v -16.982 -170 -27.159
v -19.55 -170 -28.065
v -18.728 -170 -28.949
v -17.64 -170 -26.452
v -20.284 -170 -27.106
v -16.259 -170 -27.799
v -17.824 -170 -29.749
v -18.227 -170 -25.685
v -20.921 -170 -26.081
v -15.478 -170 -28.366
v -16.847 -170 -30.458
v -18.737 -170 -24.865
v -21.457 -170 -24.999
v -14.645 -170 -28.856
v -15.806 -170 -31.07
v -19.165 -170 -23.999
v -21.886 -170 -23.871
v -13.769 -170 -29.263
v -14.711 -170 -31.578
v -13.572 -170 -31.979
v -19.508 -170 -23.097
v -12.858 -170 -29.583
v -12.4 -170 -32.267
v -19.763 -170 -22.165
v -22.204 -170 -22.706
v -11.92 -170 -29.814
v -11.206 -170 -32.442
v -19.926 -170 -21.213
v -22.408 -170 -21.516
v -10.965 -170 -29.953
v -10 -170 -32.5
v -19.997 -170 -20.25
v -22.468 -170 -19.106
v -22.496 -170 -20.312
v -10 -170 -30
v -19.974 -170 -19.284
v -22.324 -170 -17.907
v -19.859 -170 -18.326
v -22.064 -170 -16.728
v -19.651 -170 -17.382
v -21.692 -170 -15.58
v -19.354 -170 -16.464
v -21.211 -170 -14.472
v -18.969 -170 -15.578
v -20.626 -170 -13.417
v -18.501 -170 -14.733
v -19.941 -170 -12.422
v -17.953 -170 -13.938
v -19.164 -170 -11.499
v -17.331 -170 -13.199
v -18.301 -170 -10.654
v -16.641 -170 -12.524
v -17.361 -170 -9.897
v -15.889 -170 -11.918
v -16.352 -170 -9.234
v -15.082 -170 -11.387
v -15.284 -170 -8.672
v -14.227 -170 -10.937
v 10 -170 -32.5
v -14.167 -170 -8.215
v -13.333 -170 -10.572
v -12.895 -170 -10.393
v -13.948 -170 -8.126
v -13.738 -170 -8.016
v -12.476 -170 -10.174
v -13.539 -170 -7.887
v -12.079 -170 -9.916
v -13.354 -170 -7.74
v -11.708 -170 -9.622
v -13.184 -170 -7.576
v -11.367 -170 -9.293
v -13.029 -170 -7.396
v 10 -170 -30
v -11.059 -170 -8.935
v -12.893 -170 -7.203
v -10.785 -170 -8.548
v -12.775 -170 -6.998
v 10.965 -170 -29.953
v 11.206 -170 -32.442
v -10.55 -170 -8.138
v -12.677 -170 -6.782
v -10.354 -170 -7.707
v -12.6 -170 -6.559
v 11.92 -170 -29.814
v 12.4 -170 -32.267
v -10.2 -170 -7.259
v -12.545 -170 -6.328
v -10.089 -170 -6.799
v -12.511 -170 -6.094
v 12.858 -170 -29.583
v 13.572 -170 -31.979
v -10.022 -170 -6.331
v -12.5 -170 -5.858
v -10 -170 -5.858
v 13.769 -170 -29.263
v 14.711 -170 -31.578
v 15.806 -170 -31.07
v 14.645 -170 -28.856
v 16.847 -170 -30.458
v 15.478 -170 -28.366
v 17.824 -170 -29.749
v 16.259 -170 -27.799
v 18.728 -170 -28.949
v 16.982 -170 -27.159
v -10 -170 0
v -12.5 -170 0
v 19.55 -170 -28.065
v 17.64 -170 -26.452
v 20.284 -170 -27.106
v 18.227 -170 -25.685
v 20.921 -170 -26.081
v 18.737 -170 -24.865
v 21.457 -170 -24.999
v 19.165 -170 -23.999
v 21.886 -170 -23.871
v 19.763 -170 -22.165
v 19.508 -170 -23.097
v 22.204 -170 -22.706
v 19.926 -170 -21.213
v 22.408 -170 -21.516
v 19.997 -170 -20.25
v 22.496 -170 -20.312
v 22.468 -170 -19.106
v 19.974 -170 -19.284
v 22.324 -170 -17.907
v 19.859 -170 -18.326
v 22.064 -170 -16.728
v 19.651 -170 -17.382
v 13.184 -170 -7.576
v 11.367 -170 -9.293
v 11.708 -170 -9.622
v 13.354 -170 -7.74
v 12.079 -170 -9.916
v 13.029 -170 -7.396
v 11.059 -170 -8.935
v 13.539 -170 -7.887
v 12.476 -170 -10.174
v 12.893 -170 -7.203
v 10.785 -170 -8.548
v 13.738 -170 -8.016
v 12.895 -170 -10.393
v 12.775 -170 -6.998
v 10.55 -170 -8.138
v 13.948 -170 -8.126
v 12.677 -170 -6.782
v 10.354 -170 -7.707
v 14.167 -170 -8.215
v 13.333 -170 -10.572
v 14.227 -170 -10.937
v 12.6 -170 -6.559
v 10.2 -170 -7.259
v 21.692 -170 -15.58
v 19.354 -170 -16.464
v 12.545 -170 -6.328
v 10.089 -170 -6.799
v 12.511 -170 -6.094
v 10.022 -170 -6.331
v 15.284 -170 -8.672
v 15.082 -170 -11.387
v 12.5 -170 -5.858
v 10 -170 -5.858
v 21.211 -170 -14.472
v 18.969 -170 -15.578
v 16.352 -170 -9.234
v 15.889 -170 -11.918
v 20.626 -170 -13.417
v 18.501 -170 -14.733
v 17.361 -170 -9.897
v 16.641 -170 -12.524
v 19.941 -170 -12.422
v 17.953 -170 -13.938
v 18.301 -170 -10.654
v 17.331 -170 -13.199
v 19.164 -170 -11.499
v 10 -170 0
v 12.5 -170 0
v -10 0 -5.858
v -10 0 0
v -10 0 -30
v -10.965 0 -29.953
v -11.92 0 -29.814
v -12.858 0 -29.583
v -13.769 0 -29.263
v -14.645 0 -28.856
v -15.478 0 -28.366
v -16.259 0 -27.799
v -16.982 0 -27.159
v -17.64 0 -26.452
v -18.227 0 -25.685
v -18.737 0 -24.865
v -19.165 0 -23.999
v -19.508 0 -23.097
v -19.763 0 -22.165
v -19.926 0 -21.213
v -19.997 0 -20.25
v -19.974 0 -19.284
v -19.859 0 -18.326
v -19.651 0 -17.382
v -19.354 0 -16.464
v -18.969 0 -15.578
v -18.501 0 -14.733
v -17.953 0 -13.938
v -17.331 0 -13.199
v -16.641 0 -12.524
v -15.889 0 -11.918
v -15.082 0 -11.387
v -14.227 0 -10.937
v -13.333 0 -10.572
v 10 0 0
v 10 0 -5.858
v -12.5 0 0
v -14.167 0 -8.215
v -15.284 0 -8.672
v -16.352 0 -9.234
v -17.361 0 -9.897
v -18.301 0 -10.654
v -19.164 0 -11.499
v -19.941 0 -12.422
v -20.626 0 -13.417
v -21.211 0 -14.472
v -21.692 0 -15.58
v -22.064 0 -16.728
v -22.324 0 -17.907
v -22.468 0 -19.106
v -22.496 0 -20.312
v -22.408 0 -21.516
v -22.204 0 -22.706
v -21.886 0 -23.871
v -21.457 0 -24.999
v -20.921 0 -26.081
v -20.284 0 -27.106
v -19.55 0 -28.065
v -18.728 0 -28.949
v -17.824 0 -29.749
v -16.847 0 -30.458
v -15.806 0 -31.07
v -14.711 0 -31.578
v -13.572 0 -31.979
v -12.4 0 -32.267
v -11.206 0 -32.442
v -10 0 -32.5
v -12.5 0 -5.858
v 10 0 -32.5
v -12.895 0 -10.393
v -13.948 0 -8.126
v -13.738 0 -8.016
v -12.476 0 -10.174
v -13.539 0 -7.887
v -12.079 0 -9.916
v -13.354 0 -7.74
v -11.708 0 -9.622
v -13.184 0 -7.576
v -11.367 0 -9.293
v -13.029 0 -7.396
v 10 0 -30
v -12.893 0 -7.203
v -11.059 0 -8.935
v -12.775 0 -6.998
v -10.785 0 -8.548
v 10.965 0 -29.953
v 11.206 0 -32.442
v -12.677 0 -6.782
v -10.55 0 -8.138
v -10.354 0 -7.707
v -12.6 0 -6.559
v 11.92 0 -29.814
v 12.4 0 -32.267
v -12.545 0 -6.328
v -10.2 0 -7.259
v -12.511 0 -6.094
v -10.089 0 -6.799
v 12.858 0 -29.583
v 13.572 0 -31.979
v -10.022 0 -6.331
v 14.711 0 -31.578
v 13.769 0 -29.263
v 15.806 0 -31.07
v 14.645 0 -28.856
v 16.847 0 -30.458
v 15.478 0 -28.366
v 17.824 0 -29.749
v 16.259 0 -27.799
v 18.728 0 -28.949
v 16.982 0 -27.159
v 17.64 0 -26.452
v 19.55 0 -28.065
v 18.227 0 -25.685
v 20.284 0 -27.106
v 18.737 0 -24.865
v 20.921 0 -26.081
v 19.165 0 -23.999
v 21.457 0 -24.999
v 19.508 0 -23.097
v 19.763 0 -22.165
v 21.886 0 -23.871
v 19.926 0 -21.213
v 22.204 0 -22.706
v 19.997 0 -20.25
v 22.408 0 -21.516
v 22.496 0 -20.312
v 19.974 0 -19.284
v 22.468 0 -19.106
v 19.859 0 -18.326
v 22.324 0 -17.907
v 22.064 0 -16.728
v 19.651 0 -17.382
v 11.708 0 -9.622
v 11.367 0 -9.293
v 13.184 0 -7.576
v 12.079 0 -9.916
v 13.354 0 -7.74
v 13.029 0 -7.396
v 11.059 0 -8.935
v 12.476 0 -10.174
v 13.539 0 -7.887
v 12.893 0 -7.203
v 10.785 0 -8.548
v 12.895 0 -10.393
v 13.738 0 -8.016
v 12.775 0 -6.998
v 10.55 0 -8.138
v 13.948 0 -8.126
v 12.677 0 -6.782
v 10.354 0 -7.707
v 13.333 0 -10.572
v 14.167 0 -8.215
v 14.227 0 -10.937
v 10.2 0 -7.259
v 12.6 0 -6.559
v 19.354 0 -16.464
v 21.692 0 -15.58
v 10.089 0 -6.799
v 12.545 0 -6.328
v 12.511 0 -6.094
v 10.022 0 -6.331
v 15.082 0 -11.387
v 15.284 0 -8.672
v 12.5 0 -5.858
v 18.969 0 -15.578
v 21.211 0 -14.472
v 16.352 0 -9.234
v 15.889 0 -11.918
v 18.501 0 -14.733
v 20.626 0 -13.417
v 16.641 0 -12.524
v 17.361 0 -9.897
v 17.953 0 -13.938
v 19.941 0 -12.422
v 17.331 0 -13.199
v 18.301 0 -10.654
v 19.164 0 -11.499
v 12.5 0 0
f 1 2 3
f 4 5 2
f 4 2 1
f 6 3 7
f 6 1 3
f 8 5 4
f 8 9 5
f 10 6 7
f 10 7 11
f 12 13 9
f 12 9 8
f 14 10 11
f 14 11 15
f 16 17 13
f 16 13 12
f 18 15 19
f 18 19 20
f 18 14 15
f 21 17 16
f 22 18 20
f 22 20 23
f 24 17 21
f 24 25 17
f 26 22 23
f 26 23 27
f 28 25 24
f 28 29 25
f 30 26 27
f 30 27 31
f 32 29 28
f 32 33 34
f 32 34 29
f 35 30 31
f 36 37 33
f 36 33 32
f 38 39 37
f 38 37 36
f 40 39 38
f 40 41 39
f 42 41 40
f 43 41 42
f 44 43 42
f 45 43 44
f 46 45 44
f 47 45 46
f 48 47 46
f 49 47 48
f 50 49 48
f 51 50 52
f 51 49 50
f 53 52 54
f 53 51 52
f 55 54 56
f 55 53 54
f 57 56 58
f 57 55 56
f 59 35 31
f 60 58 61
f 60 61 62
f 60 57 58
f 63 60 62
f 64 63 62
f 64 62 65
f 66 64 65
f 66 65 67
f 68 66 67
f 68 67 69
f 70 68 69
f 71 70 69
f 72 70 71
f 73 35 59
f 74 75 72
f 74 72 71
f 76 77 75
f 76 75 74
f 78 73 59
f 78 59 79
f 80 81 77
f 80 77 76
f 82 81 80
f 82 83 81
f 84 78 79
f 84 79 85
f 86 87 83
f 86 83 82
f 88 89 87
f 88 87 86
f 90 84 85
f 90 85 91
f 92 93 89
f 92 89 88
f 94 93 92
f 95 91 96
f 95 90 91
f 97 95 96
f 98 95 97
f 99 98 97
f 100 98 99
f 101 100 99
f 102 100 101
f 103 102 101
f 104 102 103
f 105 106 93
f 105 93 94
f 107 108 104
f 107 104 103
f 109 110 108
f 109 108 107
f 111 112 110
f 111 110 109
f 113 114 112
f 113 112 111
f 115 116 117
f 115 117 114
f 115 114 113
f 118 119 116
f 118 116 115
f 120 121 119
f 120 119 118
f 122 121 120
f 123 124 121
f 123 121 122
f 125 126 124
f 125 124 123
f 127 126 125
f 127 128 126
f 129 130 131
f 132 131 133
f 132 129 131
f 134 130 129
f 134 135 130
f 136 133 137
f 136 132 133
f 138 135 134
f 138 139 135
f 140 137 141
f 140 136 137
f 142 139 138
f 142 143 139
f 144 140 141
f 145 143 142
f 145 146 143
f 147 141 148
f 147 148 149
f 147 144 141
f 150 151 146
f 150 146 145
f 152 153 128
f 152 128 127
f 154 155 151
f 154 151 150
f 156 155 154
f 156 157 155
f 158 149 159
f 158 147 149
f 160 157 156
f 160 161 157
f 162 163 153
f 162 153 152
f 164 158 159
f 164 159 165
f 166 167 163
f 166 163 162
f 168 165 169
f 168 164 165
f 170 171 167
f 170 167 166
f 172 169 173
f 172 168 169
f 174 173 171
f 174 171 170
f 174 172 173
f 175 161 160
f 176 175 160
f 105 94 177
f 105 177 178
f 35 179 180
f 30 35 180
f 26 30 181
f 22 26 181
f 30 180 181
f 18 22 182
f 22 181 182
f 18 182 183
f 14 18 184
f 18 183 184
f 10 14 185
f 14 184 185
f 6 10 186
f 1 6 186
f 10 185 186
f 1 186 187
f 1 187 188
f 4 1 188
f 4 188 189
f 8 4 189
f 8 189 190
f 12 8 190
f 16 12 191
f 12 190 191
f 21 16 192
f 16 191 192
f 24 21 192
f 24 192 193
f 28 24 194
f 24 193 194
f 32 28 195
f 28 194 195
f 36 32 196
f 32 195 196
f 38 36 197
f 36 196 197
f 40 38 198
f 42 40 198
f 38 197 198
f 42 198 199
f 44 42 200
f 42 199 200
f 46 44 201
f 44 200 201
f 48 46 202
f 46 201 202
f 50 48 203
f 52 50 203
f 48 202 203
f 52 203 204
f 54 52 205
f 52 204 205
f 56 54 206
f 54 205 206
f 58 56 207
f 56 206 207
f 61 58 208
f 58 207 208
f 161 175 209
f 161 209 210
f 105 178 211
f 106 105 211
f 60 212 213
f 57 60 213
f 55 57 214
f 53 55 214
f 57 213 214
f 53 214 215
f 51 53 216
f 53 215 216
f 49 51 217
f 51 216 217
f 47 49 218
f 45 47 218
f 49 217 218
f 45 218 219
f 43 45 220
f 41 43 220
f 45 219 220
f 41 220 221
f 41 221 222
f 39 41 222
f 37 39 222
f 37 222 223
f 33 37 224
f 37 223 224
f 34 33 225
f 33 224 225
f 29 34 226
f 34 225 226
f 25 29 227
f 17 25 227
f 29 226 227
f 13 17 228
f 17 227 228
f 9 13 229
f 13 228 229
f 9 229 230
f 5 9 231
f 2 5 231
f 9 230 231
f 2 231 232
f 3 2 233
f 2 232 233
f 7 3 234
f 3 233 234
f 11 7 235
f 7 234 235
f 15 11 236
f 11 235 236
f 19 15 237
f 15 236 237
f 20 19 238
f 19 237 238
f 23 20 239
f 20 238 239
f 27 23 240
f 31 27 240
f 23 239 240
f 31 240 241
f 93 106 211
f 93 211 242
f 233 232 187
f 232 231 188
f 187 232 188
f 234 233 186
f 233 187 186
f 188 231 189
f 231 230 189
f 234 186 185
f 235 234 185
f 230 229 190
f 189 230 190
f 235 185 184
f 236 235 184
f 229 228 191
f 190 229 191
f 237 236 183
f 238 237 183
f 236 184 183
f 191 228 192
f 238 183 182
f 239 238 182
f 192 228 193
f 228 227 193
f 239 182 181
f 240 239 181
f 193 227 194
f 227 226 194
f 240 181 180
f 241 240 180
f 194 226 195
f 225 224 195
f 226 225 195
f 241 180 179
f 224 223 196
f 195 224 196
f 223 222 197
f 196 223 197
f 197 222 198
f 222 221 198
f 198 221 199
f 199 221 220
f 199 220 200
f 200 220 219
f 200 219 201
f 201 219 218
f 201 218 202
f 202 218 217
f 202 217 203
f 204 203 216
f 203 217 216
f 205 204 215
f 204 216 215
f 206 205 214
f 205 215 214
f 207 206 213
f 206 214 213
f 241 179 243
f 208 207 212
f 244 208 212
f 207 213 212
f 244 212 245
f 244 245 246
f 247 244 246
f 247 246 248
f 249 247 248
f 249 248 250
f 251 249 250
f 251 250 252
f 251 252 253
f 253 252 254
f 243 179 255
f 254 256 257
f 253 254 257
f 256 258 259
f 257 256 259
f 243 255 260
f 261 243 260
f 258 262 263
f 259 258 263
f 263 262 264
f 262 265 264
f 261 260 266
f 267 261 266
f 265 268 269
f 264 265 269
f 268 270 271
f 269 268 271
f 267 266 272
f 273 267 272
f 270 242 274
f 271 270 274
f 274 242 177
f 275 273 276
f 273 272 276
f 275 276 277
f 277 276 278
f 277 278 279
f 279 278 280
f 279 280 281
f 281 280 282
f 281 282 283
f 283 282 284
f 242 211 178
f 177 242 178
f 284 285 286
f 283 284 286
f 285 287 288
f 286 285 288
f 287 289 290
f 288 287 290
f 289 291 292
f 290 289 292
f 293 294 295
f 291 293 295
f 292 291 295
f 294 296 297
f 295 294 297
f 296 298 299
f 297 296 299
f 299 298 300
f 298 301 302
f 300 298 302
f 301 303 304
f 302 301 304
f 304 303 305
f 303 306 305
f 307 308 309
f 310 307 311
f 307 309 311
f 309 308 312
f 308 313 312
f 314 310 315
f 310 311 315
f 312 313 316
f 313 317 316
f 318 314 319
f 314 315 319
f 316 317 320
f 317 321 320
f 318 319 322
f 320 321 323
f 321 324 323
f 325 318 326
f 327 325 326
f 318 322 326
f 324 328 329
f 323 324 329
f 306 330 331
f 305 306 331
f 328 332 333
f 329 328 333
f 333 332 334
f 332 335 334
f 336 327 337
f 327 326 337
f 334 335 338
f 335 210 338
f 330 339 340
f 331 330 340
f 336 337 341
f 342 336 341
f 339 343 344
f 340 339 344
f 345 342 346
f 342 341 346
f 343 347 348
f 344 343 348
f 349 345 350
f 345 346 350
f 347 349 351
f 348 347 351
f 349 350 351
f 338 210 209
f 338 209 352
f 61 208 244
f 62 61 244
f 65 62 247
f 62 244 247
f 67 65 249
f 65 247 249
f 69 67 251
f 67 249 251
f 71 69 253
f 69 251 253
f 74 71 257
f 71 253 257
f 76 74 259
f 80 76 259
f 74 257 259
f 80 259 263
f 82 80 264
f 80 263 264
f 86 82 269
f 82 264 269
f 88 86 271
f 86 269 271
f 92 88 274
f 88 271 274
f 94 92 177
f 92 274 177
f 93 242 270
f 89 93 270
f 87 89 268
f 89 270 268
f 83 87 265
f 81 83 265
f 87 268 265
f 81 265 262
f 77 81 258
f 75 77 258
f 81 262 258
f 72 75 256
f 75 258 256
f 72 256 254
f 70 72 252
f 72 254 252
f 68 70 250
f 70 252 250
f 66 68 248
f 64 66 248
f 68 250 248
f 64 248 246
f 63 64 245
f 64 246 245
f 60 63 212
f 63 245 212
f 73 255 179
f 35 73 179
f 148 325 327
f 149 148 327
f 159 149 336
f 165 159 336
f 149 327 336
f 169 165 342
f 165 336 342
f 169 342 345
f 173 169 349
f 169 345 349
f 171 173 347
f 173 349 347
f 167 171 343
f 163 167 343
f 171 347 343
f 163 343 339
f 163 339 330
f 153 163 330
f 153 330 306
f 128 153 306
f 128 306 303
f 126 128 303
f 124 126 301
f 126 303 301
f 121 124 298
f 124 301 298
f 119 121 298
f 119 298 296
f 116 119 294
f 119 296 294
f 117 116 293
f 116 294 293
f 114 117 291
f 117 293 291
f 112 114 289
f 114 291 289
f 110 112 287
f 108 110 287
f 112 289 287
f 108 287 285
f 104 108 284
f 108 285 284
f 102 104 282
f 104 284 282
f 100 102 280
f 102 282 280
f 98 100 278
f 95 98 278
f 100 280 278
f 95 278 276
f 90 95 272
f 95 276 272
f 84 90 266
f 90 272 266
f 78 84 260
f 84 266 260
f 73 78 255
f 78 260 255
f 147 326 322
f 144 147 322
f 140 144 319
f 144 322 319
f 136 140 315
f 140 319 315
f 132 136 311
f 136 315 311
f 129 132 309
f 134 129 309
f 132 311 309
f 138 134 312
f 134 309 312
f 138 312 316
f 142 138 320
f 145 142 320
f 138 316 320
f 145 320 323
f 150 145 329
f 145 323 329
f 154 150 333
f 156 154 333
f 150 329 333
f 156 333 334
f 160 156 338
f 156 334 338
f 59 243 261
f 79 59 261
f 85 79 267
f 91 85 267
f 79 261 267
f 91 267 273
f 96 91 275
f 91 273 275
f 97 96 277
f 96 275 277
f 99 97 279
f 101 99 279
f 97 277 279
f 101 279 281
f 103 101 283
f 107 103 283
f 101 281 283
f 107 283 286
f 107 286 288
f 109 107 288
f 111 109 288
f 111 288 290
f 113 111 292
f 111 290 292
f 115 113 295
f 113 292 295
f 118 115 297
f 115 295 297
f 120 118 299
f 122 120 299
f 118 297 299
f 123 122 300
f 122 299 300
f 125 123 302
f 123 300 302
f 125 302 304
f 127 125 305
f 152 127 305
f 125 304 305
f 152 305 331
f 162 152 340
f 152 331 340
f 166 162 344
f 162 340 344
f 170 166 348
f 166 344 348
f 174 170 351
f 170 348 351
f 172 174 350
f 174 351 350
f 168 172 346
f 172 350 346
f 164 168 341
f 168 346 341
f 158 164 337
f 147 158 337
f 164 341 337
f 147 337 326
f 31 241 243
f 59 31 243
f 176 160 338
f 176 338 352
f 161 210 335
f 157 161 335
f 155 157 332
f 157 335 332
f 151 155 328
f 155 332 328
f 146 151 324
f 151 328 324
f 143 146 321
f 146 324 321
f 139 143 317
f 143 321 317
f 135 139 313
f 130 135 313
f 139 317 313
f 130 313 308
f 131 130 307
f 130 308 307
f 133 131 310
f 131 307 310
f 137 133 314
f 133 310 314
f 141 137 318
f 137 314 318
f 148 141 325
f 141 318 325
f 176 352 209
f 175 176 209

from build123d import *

# Parameters (mm, degrees)
F1_DEPTH = 170


with BuildPart() as f1:
    # F0 (on Front) → F1 (new body)
    with BuildSketch(Plane.XZ):
        with BuildLine():
            Line((-10, -5.857864), (-10, 0))
            Line((-10, 0), (-12.5, 0))
            Line((-12.5, 0), (-12.5, -5.857864))
            ThreePointArc((-12.5, -5.857864), (-12.958759, -7.30124), (-14.166667, -8.214887))
            ThreePointArc((-14.166667, -8.214887), (-22.319982, -22.113775), (-10, -32.5))
            Line((-10, -32.5), (10, -32.5))
            ThreePointArc((10, -32.5), (22.319982, -22.113775), (14.166667, -8.214887))
            ThreePointArc((14.166667, -8.214887), (12.958759, -7.30124), (12.5, -5.857864))
            Line((12.5, -5.857864), (12.5, 0))
            Line((12.5, 0), (10, 0))
            Line((10, 0), (10, -5.857864))
            ThreePointArc((10, -5.857864), (10.917517, -8.744616), (13.333333, -10.57191))
            ThreePointArc((13.333333, -10.57191), (19.855986, -21.69102), (10, -30))
            Line((10, -30), (-10, -30))
            ThreePointArc((-10, -30), (-19.855986, -21.69102), (-13.333333, -10.57191))
            ThreePointArc((-13.333333, -10.57191), (-10.917517, -8.744616), (-10, -5.857864))
        make_face()
    extrude(amount=F1_DEPTH)


solid = f1.part
